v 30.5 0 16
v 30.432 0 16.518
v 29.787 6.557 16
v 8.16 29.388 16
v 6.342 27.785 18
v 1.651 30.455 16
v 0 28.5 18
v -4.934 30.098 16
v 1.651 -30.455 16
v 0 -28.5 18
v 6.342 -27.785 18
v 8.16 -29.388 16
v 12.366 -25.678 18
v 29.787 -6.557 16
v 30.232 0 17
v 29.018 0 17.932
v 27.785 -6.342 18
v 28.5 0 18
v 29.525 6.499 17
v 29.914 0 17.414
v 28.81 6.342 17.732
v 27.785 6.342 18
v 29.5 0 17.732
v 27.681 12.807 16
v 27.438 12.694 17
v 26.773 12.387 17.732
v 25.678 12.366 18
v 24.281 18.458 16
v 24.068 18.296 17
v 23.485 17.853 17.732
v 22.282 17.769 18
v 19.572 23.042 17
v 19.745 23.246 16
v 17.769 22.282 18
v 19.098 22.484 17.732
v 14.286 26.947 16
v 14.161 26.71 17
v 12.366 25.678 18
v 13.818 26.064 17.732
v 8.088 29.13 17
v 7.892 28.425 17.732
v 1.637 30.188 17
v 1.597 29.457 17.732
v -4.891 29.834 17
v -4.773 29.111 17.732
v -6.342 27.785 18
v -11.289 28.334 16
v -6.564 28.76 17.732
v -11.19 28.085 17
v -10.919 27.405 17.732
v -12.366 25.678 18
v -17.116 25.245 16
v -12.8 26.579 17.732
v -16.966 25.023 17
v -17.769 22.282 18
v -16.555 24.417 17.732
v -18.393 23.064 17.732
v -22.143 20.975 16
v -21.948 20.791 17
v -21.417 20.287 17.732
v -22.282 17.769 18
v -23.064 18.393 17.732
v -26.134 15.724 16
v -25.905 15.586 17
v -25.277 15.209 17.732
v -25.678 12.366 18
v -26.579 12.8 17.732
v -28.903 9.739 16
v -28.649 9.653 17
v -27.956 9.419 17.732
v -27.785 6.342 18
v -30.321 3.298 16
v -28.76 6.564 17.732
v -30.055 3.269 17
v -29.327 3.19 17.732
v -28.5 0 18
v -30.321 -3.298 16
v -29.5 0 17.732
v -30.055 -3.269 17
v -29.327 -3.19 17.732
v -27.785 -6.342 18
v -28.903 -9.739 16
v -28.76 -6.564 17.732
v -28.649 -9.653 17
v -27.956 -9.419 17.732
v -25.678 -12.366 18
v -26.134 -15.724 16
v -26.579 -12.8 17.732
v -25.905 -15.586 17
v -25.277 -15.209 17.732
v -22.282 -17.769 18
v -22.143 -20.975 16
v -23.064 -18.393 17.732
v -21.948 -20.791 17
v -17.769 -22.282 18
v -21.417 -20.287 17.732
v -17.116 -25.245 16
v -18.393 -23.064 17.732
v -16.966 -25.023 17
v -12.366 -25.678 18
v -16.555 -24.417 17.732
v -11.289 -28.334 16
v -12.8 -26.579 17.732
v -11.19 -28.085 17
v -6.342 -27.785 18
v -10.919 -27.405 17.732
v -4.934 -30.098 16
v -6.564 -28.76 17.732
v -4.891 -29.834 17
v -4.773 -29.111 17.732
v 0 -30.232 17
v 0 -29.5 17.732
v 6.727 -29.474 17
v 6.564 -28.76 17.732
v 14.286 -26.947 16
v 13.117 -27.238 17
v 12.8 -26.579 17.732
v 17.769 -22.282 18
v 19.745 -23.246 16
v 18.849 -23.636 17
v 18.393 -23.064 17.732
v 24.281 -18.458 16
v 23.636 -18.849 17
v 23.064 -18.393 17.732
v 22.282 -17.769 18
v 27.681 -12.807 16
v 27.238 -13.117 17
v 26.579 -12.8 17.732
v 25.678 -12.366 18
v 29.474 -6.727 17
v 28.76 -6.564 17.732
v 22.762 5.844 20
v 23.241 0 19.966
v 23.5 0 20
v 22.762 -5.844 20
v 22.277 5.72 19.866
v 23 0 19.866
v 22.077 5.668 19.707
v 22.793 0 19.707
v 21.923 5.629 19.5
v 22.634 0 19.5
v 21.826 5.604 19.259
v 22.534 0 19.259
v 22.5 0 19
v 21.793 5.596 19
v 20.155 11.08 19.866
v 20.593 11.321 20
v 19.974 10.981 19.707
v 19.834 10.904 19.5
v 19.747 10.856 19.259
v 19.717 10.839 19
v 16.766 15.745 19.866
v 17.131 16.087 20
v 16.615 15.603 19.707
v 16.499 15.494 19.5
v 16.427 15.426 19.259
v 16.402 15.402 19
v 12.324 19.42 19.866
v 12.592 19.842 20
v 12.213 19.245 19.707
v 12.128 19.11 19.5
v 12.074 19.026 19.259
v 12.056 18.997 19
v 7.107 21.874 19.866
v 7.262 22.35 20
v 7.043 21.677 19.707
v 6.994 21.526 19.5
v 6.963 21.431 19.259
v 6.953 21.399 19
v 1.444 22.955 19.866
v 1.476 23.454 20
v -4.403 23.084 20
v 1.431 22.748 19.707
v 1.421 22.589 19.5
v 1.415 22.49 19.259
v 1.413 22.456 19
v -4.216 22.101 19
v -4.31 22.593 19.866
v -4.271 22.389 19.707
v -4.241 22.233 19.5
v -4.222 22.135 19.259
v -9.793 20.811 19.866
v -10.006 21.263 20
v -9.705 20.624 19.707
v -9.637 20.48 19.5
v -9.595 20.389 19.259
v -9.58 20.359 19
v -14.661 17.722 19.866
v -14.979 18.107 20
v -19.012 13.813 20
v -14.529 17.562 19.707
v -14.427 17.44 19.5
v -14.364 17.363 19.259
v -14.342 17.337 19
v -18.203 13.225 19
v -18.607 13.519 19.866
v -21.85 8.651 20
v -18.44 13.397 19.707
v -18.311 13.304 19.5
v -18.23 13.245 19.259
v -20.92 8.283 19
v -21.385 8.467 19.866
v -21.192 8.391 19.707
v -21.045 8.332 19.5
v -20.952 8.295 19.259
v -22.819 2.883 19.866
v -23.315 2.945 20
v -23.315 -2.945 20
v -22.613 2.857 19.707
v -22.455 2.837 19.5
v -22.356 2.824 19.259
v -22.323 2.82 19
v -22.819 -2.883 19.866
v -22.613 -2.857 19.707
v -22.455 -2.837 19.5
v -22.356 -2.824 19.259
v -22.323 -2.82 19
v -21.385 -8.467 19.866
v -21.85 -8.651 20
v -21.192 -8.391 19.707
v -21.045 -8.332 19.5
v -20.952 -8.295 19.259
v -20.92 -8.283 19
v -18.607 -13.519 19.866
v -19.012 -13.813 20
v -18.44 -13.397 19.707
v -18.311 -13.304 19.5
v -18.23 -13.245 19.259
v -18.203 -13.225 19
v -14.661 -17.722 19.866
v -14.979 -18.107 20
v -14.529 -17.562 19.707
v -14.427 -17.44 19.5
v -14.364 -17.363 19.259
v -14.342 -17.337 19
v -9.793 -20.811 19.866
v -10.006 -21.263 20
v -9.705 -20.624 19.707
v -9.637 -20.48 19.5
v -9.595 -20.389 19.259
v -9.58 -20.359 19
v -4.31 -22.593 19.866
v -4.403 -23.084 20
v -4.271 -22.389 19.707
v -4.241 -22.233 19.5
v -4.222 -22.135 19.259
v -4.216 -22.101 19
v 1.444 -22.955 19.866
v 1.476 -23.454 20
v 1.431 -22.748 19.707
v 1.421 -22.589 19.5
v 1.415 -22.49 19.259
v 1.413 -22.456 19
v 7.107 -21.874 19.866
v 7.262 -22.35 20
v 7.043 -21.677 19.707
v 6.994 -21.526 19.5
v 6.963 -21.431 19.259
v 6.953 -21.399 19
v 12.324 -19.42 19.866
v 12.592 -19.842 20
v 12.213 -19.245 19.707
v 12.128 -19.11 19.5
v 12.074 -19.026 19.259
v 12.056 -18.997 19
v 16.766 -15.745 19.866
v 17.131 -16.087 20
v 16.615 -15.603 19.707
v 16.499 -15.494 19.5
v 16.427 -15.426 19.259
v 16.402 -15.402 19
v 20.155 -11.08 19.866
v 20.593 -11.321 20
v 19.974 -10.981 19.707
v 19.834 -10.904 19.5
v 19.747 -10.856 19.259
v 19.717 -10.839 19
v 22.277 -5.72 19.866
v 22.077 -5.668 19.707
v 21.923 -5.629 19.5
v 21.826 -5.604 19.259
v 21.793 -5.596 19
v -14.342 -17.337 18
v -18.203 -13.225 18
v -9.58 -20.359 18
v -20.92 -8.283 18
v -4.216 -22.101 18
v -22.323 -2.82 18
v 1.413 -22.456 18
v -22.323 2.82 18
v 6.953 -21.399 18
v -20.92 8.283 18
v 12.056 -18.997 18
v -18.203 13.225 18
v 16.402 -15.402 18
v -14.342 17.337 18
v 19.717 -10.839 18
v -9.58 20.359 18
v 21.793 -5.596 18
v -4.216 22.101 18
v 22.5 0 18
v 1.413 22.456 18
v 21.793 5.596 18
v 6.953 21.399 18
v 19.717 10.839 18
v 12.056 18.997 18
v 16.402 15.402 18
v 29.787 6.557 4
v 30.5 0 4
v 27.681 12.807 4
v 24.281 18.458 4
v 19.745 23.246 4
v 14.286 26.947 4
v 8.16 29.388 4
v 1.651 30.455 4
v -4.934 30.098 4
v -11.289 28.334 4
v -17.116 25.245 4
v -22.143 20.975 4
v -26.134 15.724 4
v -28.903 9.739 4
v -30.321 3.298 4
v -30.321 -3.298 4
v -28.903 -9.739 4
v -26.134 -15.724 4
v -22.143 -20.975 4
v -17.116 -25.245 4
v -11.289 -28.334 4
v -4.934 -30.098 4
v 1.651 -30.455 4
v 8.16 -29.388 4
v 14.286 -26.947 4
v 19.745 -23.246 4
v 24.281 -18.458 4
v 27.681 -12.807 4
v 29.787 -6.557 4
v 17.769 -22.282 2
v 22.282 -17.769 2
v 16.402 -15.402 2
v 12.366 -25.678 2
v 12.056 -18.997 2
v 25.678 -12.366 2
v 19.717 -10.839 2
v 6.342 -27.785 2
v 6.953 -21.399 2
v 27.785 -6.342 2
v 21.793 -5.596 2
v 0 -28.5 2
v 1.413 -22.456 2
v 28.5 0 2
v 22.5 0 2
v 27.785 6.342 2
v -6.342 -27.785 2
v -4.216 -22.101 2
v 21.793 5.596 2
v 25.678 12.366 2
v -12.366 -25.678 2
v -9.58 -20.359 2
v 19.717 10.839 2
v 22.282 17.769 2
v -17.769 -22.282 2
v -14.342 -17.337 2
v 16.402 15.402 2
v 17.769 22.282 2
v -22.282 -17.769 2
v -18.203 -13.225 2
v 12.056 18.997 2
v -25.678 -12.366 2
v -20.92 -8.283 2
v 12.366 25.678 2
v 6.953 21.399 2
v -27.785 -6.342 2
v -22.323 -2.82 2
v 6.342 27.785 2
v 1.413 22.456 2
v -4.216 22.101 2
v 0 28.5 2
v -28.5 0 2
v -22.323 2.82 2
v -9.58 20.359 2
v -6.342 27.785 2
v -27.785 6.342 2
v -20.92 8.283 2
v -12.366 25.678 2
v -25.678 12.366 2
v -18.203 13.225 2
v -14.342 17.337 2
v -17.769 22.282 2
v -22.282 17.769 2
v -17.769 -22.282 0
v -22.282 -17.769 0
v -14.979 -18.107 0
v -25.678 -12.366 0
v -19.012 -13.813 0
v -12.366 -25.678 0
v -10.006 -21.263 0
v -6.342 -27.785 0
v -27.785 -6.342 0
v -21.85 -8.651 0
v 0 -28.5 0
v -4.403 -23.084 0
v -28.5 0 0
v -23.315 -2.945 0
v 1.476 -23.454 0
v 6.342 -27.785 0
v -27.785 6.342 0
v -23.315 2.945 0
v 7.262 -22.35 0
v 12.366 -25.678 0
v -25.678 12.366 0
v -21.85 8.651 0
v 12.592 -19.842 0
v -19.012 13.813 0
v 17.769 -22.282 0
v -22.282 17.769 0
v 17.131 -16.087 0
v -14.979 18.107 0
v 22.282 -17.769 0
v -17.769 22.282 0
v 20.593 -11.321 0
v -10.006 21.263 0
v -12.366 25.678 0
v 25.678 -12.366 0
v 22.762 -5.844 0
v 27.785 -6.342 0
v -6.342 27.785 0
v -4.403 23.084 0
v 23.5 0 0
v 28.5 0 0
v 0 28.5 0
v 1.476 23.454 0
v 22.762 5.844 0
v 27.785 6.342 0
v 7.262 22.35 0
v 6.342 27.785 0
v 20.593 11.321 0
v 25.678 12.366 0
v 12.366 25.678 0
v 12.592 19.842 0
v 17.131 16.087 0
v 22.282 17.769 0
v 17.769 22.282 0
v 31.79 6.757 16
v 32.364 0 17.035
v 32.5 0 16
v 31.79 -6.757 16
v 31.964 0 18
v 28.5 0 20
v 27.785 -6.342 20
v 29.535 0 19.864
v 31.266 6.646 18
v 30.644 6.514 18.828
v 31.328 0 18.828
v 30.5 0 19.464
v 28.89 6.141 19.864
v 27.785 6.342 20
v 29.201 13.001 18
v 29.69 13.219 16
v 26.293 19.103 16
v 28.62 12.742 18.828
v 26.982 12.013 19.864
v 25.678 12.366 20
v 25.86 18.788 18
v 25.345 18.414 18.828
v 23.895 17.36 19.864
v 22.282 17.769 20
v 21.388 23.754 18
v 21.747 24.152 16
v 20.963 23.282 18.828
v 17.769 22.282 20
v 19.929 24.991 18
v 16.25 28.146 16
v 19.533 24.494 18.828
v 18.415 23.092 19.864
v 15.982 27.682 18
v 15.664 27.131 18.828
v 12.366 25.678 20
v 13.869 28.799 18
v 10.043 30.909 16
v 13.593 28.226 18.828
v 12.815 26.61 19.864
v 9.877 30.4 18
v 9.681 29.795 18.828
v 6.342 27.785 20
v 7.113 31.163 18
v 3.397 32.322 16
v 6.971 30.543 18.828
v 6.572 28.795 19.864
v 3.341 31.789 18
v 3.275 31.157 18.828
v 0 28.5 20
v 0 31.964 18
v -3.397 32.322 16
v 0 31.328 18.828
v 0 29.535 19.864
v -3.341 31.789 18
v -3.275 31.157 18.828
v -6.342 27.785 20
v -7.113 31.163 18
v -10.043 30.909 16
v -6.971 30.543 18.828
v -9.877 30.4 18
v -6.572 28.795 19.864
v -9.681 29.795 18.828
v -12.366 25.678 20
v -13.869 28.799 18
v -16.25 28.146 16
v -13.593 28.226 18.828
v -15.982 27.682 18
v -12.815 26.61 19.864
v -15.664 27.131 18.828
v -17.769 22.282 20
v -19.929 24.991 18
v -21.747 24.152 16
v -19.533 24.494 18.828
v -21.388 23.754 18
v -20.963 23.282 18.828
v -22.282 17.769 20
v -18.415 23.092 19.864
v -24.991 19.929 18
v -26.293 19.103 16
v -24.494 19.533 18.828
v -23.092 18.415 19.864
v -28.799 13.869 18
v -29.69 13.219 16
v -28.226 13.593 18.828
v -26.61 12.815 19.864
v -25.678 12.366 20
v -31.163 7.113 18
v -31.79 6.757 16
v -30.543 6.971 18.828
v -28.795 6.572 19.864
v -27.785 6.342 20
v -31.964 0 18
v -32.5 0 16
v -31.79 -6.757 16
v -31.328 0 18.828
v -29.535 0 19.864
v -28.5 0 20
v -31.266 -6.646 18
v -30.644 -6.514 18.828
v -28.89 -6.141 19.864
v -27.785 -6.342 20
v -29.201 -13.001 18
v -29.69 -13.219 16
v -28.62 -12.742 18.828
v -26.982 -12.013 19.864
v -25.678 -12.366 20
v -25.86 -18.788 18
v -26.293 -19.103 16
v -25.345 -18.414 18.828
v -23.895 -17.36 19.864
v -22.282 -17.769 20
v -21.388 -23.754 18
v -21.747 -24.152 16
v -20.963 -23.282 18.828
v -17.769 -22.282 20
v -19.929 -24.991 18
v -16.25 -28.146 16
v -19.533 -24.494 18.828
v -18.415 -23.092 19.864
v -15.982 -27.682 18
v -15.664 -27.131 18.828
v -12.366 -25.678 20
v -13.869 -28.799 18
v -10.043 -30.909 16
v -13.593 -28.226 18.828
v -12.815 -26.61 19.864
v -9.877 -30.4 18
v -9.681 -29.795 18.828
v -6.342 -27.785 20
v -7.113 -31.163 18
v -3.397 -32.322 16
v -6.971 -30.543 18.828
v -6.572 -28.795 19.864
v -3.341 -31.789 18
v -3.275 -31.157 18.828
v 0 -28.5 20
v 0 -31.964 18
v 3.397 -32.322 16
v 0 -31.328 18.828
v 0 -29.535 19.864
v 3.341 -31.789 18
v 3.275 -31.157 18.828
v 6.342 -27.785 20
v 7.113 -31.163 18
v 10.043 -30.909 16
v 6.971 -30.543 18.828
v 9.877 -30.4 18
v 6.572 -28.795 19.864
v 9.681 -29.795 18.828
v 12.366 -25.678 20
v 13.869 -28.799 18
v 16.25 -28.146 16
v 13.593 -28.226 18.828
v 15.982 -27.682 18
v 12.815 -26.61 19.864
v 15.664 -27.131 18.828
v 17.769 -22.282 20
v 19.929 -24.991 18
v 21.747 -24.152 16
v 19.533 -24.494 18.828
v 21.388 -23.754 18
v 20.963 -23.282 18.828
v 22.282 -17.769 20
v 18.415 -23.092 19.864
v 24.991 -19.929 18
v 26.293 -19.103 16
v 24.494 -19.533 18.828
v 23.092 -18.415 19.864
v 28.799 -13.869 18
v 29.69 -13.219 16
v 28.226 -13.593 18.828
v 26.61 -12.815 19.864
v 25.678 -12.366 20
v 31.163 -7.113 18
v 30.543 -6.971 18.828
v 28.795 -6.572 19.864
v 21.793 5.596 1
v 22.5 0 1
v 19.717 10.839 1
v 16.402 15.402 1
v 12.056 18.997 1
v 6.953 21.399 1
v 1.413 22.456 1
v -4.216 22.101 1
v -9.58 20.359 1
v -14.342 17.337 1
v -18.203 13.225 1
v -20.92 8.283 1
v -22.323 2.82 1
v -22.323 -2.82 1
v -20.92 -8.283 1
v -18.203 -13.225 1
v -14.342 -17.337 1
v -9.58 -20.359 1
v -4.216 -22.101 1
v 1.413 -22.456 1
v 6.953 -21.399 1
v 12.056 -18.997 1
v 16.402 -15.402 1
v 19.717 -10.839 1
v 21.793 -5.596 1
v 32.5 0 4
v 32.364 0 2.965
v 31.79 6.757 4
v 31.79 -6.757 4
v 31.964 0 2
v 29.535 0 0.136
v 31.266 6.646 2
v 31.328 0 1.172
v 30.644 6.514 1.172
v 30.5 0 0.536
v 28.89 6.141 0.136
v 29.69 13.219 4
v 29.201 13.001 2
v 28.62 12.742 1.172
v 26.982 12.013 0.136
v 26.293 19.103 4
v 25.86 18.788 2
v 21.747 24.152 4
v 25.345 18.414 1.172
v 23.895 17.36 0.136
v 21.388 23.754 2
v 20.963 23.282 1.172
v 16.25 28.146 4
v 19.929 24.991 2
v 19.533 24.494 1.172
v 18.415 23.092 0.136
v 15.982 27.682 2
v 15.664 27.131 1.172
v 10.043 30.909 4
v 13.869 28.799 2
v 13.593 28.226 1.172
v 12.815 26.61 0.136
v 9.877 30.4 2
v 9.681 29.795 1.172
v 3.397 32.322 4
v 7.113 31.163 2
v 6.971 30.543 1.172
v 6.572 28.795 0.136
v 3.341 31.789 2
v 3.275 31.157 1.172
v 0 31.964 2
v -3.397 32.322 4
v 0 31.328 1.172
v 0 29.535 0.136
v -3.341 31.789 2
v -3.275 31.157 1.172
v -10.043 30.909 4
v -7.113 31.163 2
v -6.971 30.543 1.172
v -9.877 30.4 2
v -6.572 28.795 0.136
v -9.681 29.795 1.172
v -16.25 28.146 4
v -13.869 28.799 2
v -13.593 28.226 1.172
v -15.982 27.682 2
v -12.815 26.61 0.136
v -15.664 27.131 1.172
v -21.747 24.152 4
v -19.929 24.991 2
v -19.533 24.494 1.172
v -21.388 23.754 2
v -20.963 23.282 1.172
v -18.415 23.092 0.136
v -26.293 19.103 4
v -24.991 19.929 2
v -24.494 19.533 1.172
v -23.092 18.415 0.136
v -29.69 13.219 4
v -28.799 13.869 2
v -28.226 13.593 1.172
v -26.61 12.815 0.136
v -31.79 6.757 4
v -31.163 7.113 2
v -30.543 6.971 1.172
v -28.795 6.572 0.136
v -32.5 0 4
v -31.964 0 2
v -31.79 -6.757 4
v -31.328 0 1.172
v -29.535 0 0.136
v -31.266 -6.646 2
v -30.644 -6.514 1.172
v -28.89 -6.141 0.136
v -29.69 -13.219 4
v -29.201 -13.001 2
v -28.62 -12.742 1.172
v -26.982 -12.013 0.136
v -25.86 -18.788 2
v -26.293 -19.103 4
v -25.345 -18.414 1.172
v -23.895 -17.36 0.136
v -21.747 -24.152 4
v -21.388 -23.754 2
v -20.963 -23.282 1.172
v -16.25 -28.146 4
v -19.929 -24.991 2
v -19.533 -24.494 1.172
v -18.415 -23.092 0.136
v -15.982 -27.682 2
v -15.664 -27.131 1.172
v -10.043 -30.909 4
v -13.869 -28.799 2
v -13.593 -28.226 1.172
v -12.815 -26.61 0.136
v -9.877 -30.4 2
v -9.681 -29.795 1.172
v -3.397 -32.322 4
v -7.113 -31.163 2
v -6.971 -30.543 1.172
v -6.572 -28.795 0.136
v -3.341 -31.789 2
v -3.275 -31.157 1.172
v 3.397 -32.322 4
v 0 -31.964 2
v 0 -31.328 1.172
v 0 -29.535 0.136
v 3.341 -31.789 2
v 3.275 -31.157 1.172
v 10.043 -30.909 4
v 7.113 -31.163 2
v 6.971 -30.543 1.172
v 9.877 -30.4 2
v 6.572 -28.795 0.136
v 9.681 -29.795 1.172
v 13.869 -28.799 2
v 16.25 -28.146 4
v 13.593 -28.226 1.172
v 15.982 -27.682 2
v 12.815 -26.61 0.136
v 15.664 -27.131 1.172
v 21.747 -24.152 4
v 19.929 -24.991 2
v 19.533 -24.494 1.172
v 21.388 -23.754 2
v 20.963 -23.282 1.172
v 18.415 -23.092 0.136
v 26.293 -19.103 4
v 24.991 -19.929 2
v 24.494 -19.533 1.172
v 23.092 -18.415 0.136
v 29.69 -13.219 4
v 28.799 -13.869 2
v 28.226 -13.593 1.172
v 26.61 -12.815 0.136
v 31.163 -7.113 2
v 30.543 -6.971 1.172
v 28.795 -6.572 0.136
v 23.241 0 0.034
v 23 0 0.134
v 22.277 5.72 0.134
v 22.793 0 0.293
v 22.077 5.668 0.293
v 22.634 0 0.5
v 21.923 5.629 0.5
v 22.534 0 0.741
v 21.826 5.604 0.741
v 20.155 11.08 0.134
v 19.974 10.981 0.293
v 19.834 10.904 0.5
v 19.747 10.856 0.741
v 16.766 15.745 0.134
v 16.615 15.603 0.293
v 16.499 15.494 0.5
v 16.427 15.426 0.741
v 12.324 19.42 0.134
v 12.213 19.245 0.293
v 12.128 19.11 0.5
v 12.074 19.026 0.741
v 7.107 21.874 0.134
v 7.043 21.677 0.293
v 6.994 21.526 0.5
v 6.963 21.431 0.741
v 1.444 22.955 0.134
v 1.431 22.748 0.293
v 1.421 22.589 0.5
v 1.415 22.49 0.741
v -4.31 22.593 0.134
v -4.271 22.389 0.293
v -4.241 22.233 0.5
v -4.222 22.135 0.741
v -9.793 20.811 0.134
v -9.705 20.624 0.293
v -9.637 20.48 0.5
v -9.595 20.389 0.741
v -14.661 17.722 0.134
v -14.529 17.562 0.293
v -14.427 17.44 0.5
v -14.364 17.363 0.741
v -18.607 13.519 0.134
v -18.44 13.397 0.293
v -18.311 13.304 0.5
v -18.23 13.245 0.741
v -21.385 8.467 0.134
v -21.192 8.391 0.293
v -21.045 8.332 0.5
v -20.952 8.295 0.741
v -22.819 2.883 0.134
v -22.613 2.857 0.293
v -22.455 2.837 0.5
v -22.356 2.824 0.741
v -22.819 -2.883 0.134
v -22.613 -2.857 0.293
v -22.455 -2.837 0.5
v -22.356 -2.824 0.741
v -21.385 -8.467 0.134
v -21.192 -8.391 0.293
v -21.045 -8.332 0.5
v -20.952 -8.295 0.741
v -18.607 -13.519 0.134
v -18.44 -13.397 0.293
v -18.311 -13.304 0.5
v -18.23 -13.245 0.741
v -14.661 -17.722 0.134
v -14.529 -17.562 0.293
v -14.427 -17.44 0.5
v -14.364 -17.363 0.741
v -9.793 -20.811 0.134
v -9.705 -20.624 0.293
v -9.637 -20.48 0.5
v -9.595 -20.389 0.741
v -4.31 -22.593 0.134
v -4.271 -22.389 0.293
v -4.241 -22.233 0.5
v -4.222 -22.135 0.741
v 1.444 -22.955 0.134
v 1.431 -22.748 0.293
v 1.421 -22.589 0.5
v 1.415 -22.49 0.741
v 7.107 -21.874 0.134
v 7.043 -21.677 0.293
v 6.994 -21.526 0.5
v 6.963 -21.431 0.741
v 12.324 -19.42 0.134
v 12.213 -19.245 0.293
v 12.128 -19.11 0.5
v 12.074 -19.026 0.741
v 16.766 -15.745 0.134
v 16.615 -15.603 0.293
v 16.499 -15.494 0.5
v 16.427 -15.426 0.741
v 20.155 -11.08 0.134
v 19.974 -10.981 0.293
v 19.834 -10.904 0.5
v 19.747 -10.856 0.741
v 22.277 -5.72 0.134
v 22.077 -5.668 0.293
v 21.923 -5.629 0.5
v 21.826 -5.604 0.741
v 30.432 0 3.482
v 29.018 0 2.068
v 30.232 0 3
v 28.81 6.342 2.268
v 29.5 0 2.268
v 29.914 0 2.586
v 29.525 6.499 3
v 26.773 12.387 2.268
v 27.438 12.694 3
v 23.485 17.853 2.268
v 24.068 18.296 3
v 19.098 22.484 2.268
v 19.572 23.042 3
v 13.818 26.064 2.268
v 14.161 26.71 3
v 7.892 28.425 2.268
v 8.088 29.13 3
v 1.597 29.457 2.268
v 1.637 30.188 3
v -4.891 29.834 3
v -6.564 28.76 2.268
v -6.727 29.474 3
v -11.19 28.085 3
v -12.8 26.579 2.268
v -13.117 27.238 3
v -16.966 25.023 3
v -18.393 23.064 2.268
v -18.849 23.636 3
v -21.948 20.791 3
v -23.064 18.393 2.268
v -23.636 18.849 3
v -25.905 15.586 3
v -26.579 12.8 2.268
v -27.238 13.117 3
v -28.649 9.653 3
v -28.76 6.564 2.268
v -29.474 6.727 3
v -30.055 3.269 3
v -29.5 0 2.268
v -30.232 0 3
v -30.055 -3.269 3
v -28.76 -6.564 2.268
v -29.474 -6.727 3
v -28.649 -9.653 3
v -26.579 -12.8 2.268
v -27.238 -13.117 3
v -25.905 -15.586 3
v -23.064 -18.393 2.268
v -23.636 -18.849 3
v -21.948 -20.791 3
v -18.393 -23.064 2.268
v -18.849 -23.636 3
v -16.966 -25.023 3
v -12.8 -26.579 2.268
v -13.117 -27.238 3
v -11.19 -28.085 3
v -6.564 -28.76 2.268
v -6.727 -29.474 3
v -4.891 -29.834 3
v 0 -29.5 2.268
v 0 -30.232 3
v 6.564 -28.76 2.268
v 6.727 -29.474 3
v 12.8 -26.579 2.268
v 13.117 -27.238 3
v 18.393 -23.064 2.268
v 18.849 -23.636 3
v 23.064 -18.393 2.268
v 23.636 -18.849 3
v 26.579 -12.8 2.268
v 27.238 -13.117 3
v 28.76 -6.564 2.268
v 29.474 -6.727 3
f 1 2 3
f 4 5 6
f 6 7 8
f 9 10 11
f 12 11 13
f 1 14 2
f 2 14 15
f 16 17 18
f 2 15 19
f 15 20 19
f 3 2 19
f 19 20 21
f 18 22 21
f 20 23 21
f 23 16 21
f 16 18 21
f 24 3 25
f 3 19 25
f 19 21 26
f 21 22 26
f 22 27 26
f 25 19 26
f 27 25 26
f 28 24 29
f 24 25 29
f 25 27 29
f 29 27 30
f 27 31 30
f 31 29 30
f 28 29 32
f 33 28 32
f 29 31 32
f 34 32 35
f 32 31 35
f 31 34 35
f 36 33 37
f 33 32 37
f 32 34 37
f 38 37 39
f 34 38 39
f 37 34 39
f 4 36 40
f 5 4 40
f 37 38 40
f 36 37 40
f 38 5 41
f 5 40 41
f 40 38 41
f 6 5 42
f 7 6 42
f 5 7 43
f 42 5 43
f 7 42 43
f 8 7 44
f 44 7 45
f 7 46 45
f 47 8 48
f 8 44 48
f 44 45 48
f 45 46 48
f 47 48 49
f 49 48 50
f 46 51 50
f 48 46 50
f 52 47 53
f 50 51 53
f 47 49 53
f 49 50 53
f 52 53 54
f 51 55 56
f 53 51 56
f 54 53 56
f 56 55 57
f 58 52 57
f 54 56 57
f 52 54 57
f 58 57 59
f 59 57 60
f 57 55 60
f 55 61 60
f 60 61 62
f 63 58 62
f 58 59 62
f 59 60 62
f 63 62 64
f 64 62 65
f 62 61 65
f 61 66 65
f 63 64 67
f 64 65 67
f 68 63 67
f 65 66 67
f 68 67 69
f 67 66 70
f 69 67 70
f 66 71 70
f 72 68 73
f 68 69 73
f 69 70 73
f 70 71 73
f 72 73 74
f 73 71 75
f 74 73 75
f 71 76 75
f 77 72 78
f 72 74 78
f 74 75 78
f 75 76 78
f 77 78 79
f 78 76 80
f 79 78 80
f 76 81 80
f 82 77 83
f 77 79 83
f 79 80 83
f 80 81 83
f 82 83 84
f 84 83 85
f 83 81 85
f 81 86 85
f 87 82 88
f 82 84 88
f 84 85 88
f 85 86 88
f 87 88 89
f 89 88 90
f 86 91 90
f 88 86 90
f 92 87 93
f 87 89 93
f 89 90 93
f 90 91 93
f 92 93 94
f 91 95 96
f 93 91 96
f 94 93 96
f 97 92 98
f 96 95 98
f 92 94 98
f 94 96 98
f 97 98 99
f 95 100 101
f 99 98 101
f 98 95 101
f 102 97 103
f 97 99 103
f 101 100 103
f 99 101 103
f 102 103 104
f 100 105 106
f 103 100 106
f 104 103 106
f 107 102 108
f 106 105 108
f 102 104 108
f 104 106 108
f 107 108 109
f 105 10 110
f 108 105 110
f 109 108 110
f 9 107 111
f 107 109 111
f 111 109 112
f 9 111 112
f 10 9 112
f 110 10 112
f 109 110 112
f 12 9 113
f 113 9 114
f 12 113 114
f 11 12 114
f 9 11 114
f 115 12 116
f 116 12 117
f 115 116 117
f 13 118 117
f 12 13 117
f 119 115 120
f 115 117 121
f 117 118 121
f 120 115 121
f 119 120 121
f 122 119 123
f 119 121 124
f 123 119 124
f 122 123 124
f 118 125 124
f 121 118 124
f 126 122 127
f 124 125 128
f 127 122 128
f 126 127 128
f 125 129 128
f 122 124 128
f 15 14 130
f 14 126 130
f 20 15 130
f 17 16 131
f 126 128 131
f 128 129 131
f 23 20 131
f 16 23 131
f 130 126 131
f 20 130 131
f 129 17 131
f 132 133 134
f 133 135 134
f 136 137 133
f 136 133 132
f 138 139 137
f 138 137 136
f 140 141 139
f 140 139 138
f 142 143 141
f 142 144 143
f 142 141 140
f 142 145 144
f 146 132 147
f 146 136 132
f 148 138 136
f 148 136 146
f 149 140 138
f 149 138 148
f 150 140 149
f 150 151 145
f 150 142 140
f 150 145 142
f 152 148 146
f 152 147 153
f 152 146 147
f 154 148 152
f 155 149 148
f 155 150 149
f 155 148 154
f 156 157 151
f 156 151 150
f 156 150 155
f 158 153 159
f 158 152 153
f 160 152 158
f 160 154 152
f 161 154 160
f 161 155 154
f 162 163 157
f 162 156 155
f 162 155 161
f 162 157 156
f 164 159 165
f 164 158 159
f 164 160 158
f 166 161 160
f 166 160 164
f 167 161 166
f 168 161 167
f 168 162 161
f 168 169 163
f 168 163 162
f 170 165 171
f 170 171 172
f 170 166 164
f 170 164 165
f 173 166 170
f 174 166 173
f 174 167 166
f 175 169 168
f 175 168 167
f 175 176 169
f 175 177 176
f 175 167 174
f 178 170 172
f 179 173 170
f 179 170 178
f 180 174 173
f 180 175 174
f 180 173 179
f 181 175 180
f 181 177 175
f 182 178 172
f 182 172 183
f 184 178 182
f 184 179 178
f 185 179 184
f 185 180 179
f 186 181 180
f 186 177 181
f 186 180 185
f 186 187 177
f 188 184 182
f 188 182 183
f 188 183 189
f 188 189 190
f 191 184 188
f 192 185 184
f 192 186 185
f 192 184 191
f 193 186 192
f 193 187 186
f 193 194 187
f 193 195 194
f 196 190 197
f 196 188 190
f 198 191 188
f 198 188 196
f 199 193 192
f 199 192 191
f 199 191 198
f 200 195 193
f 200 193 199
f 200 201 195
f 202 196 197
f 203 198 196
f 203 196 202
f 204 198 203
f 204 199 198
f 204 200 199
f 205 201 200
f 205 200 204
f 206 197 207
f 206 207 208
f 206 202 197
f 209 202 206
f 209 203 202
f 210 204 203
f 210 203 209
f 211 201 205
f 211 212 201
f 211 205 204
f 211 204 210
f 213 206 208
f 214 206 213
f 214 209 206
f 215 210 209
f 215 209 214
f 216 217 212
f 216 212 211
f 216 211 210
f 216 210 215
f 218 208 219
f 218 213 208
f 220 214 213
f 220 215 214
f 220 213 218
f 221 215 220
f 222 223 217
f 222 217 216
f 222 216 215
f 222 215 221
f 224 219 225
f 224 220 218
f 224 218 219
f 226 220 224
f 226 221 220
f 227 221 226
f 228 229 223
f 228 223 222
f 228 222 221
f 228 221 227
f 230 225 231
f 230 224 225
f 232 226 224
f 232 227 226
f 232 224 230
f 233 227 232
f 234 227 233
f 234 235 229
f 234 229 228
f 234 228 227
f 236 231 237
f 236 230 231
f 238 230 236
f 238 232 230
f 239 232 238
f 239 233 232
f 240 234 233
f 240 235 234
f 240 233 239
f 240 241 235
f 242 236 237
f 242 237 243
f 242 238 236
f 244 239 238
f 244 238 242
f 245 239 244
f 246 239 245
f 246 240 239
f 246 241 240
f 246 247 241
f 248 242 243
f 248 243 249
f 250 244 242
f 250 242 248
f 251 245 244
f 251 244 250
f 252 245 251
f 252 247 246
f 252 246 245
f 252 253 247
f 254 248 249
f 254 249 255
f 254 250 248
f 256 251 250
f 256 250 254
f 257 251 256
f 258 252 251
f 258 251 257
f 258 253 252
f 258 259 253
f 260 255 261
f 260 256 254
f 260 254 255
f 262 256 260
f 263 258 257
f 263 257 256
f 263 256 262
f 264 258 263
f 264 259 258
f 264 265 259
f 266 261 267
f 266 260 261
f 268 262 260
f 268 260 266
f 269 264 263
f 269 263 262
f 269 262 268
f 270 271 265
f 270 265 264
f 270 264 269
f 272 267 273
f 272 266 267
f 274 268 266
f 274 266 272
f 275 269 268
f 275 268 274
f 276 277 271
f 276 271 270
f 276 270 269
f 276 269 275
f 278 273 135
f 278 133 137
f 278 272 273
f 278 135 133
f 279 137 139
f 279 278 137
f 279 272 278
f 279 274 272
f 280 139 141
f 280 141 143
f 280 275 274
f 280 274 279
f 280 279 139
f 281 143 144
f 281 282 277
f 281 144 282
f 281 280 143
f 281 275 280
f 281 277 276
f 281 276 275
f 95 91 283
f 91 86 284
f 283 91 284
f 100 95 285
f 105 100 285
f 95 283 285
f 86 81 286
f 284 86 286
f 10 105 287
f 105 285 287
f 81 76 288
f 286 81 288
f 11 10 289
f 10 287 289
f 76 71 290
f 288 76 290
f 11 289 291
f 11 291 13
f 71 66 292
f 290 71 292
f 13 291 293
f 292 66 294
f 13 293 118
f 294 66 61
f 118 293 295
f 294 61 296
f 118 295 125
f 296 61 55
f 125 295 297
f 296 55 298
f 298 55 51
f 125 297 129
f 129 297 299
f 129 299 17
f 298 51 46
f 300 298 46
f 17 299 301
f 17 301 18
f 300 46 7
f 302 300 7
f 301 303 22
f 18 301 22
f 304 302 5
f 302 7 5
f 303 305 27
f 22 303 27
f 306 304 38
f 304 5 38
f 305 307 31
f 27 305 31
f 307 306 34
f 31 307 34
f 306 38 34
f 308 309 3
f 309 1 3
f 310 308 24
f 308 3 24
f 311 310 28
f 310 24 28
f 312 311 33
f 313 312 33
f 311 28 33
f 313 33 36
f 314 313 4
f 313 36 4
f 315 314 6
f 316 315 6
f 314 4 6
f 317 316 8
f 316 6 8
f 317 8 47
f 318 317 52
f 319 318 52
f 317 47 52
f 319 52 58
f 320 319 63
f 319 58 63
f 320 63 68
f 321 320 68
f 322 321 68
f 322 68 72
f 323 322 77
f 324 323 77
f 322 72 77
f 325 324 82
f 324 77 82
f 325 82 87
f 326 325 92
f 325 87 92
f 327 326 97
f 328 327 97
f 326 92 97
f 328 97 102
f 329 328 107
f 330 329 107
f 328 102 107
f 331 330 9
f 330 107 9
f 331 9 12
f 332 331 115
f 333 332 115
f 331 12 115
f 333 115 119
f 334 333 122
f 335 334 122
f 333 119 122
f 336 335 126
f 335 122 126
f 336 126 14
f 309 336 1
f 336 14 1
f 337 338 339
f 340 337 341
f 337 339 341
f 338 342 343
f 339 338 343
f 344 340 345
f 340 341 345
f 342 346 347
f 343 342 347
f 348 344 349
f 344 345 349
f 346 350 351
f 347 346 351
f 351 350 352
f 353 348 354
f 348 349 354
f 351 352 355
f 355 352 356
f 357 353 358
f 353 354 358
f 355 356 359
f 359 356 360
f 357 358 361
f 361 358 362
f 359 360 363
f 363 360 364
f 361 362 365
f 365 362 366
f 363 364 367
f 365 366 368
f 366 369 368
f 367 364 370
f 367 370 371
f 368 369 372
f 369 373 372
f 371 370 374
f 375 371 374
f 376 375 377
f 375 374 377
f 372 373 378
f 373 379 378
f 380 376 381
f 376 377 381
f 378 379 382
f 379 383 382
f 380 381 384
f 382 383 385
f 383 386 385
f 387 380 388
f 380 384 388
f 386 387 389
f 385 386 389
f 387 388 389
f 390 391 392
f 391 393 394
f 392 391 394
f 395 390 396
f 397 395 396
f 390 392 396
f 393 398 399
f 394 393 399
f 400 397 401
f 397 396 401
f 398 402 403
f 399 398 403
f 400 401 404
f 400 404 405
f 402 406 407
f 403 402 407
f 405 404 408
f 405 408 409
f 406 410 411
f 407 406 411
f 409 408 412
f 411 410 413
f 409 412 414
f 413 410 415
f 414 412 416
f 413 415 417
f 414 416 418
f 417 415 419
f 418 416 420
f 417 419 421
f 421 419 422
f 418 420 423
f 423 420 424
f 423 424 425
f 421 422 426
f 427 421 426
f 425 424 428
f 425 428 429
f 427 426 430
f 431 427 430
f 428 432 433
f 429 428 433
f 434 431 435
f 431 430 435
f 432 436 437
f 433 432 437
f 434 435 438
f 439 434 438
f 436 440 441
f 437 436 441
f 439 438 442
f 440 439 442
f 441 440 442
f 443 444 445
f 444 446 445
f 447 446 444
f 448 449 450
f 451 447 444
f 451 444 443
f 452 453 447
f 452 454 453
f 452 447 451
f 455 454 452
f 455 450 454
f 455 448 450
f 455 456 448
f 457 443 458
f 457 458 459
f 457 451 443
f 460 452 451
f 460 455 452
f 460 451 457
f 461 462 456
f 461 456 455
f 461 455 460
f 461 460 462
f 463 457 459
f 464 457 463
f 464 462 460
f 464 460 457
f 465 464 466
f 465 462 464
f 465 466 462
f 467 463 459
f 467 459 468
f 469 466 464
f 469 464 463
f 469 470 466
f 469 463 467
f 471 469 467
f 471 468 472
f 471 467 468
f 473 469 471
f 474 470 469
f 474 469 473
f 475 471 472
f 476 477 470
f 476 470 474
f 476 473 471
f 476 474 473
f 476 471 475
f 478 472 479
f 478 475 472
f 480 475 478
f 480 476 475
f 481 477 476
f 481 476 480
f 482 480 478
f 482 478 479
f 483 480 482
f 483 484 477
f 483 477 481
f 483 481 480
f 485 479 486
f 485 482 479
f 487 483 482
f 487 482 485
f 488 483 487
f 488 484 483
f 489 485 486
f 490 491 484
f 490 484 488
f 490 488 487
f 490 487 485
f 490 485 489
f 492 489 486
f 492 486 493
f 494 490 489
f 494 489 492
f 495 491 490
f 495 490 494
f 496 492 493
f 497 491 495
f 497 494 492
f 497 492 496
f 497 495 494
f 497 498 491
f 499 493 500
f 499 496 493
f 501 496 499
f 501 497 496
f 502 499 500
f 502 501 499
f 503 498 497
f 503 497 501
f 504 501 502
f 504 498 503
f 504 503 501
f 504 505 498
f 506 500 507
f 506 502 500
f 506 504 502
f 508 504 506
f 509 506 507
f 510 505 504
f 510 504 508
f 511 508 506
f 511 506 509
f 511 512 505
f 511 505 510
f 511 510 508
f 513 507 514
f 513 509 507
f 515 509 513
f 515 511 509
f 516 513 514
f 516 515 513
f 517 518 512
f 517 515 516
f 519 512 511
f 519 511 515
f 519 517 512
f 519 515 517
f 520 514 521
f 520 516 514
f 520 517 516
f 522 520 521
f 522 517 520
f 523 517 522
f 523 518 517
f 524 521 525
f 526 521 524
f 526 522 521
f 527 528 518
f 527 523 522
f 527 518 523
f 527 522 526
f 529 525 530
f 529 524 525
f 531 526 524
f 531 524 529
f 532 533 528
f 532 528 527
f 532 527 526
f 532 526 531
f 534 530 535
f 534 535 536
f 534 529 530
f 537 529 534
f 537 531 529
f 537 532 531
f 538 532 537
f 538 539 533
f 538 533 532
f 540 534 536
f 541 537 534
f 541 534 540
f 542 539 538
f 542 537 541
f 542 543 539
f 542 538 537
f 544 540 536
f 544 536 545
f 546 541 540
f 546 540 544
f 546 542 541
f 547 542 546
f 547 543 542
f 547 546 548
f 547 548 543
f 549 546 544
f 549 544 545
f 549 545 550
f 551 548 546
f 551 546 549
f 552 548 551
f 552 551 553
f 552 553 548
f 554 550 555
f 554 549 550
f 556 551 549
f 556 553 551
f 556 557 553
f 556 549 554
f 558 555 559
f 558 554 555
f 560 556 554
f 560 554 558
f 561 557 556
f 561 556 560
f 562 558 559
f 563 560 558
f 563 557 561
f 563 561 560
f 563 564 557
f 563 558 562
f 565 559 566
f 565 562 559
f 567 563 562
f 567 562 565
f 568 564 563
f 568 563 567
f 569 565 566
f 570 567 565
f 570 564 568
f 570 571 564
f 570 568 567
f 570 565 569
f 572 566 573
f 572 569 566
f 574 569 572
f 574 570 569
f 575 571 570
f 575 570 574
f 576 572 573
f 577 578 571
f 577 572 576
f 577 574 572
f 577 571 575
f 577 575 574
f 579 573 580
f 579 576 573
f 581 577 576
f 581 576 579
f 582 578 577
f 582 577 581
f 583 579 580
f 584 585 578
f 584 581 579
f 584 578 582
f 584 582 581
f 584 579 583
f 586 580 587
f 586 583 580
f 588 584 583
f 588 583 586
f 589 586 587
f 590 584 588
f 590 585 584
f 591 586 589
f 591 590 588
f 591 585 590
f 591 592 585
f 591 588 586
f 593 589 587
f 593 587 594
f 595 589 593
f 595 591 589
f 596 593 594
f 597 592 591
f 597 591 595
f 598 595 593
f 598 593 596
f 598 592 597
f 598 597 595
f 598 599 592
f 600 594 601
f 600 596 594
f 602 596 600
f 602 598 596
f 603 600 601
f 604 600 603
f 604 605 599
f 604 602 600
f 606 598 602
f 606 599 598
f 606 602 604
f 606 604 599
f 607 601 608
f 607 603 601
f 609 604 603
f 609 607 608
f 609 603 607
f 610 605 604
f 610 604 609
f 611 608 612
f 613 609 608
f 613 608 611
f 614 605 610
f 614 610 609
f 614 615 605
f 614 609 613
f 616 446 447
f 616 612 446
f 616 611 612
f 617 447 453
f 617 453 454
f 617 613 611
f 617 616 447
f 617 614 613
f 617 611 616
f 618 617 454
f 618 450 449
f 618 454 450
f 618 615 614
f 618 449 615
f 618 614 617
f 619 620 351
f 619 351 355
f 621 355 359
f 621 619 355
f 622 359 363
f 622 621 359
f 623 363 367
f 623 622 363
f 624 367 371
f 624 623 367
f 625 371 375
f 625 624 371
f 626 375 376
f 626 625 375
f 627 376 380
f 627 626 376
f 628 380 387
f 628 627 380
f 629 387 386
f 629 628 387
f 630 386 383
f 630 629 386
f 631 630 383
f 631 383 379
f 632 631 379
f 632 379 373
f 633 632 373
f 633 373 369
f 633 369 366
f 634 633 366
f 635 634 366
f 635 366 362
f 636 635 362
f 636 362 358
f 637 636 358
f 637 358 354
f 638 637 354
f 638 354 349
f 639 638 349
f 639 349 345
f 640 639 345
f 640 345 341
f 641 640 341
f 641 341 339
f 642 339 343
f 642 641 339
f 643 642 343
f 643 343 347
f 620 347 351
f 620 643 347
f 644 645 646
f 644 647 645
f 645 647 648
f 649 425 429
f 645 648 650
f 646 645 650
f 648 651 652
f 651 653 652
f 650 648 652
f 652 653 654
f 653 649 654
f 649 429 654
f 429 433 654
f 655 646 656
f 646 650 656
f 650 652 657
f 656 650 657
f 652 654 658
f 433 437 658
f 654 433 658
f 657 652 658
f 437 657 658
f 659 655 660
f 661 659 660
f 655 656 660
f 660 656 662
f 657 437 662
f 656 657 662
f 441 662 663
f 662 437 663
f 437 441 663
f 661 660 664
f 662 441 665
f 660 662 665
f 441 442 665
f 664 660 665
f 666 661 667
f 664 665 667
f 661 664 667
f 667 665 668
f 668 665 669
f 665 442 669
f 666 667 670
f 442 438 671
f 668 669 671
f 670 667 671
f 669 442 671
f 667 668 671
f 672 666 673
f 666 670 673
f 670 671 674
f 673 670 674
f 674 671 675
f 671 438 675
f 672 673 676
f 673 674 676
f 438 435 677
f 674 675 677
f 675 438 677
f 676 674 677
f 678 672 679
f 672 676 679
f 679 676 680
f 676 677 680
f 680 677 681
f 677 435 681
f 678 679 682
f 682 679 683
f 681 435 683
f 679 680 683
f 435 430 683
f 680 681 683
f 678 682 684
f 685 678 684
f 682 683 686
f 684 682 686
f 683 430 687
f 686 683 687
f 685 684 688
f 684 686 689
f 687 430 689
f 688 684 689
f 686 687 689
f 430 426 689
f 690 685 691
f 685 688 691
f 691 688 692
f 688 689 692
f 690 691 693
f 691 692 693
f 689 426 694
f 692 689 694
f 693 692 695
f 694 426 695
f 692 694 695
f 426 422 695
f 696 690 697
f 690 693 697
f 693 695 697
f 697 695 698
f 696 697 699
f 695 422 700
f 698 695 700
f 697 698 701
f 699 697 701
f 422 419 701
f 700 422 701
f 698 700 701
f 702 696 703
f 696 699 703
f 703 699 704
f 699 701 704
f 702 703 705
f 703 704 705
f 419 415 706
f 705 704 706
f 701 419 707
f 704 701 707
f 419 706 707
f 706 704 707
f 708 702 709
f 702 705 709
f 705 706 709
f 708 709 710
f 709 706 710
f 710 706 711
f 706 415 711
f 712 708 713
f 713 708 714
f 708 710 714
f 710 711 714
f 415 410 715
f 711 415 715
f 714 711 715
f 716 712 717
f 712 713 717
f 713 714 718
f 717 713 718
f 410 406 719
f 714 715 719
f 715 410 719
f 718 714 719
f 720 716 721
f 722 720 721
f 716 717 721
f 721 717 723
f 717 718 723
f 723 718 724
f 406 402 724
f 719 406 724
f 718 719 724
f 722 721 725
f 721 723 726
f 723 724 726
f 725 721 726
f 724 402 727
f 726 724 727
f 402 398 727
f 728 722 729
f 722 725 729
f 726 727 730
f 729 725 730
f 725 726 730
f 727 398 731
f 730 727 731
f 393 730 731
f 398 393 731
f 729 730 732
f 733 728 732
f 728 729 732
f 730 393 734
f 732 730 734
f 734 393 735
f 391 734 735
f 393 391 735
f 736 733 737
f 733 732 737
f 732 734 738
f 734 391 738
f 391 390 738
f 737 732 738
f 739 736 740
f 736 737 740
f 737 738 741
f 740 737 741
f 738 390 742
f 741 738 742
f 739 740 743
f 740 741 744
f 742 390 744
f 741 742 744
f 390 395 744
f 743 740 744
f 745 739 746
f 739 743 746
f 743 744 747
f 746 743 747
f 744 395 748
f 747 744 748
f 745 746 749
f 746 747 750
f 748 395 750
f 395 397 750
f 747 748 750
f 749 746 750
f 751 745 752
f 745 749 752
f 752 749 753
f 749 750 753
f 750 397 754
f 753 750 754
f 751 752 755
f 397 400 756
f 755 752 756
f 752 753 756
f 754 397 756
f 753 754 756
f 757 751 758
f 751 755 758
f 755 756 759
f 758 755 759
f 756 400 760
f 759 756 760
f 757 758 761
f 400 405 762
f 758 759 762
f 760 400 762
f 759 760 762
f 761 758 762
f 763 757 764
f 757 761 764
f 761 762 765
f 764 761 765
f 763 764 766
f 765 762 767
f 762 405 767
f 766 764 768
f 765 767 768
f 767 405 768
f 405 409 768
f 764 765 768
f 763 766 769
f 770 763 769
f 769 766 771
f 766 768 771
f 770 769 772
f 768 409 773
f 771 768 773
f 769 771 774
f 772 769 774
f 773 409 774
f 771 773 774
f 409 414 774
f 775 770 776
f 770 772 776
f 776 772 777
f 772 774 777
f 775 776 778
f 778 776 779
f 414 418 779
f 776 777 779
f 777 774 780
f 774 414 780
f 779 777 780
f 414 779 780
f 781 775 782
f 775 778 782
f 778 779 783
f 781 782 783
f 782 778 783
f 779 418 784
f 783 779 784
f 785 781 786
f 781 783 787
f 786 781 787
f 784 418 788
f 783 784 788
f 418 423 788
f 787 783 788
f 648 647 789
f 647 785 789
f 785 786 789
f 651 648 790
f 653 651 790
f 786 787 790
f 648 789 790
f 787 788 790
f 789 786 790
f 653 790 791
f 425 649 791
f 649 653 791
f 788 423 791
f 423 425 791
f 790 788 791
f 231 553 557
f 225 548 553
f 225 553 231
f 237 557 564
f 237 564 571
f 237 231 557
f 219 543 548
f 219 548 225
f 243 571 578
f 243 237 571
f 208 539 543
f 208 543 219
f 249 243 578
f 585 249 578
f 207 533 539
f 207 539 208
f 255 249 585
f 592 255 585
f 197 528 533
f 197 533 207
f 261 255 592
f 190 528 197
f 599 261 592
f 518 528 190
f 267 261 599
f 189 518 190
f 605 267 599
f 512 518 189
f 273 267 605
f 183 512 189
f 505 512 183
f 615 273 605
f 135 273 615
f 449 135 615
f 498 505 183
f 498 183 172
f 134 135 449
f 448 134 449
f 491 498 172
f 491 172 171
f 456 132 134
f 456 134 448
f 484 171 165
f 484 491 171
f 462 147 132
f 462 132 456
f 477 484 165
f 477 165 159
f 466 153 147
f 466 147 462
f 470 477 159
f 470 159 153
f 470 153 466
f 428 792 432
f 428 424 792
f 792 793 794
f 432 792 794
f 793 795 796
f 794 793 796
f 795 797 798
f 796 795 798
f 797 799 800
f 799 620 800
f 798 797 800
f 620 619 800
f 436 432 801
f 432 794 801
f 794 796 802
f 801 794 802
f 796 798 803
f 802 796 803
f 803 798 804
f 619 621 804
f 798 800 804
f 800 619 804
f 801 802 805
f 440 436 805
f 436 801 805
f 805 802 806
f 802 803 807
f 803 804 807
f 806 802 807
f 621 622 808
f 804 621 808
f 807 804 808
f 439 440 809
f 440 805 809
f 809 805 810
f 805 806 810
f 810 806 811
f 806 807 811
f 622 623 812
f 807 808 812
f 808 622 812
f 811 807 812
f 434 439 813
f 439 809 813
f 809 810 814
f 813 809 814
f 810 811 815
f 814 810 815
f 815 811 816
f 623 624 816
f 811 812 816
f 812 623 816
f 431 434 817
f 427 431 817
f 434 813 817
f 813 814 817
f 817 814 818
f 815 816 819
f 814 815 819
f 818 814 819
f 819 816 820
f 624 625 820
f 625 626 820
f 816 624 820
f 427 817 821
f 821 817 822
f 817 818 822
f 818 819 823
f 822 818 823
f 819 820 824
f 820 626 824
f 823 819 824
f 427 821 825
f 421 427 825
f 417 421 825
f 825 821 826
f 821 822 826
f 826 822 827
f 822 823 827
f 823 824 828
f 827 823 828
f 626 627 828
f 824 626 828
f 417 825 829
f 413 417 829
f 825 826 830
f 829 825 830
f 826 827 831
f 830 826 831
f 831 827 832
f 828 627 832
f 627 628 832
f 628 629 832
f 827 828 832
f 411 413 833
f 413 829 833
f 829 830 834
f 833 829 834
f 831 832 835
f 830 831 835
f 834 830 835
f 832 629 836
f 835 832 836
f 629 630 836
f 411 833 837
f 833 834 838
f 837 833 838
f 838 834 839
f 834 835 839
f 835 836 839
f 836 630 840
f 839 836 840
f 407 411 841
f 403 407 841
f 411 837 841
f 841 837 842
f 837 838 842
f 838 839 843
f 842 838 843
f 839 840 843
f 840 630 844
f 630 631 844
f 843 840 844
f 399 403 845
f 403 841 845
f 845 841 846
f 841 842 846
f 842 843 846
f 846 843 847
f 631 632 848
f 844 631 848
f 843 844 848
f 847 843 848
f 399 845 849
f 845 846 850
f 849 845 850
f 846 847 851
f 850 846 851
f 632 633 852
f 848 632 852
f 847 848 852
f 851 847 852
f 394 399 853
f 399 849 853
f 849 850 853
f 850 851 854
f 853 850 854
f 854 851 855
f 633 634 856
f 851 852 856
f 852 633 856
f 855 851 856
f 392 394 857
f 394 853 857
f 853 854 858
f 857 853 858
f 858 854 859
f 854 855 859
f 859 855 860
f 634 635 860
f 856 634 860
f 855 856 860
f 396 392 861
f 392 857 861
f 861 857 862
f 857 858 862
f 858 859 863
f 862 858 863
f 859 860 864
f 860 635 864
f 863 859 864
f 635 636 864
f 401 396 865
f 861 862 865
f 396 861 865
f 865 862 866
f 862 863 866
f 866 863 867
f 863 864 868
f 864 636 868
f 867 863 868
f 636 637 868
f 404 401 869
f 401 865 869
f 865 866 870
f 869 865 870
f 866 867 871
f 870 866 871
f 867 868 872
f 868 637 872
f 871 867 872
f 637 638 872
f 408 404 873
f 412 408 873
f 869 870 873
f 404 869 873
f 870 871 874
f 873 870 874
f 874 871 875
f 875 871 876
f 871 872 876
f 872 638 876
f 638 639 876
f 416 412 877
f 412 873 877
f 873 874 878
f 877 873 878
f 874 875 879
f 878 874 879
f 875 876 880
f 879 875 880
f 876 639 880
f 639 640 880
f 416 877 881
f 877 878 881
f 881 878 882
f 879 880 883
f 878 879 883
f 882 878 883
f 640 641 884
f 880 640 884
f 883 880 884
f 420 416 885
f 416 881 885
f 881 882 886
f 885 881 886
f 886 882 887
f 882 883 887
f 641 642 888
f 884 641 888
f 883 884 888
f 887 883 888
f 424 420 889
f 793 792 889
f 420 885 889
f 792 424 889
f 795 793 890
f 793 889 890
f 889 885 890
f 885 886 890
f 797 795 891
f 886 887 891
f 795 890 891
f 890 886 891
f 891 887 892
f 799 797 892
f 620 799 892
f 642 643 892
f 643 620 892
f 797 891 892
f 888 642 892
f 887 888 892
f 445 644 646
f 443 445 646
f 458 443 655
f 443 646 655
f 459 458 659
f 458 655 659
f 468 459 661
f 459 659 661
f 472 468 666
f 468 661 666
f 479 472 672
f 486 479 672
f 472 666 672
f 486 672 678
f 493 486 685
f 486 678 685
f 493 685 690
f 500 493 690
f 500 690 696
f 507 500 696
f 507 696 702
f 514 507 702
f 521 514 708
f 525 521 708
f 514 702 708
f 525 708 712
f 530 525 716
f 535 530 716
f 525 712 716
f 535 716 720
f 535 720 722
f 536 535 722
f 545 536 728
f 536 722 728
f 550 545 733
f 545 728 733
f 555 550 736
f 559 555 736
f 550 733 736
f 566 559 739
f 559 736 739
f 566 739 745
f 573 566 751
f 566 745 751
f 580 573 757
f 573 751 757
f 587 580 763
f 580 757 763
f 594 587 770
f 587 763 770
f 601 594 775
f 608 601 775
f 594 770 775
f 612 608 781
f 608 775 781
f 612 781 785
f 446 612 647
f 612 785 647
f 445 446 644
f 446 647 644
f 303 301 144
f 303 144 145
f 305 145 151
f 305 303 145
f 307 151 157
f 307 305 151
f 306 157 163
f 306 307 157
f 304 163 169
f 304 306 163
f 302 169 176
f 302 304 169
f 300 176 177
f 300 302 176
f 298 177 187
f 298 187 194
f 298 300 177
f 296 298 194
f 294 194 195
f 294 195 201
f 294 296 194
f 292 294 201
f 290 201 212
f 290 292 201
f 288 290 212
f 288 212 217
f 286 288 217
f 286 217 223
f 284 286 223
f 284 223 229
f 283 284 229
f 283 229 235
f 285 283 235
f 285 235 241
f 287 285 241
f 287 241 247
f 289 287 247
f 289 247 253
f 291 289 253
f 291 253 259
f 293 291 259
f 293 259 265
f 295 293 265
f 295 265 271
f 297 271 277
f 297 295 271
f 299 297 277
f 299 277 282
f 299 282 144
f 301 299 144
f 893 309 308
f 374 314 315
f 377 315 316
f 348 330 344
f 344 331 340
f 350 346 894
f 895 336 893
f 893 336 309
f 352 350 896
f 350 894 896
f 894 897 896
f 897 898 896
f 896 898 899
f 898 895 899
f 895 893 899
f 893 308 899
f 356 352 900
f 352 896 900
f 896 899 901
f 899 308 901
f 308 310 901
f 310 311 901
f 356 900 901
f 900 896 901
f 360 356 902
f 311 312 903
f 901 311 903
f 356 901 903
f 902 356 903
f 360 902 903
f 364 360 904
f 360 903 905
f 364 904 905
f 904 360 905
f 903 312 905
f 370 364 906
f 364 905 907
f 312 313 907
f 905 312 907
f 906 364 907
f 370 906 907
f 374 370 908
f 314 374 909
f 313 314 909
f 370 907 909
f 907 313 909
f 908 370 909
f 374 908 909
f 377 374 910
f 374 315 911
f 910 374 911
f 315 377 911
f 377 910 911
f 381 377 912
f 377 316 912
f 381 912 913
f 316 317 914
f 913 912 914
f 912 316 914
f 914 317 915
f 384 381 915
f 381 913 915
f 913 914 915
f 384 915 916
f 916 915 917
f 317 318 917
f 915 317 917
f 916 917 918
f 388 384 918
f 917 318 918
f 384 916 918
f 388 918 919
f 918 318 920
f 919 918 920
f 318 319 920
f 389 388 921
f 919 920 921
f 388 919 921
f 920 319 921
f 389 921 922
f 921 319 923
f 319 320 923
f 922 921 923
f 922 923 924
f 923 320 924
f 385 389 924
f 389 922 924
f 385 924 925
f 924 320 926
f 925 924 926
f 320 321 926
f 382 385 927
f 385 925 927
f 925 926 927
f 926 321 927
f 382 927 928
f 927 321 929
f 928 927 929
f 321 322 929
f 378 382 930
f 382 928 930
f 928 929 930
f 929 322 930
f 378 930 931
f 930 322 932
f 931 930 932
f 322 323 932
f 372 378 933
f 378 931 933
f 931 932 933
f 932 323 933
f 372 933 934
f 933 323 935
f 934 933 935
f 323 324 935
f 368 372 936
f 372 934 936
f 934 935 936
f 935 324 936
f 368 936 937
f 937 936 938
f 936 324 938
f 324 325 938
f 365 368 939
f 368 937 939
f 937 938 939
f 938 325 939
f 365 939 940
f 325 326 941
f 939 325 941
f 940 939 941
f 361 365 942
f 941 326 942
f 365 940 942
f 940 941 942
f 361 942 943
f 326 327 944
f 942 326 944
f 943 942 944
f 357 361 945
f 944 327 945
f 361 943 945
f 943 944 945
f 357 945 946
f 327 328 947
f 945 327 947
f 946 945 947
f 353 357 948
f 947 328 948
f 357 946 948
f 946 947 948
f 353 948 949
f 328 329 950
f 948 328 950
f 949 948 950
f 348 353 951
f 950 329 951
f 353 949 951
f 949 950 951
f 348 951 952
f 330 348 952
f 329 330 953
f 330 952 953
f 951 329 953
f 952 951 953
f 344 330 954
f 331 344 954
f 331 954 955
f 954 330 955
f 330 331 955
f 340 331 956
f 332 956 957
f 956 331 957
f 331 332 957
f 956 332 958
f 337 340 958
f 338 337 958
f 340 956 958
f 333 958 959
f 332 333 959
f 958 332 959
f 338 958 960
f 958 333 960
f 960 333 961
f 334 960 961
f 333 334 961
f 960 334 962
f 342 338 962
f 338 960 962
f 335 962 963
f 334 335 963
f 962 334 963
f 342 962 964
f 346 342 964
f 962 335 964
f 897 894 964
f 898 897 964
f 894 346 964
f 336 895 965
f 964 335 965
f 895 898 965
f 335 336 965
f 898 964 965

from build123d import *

# Parameters (mm, degrees)
SKETCH1_R           = 32.5
SKETCH1_R_2         = 22.5
EXTRUDE_THIN1_DEPTH = 20
FILLET1_R           = 4
FILLET2_R           = 1


# Read off the part's stored shape, not the designer's step: Shell1
with BuildPart() as part:
    # Sketch1 → Extrude-Thin1 (new body)
    with BuildSketch(Plane.XY):
        Circle(SKETCH1_R)
        Circle(SKETCH1_R_2, mode=Mode.SUBTRACT)
    extrude(amount=EXTRUDE_THIN1_DEPTH)

    # Fillet1
    fillet1_edges = [part.edges().sort_by_distance(p)[0] for p in [
        (-32.5, 0, 0),
        (-32.5, 0, 20),
    ]]
    fillet(fillet1_edges, radius=FILLET1_R)

    # Fillet2
    fillet2_edges = [part.edges().sort_by_distance(p)[0] for p in [
        (-22.5, 0, 0),
        (-22.5, 0, 20),
    ]]
    fillet(fillet2_edges, radius=FILLET2_R)

    # Shell1 outline → Shell1 (revolve, cut)
    with BuildSketch(Plane.XZ):
        with BuildLine():
            Line((28.5, 18), (22.5, 18))
            Line((22.5, 18), (22.5, 2))
            Line((22.5, 2), (28.5, 2))
            ThreePointArc((28.5, 2), (29.914213562, 2.585786438), (30.5, 4))
            Line((30.5, 4), (30.5, 16))
            ThreePointArc((30.5, 16), (29.914213562, 17.414213562), (28.5, 18))
        make_face()
    revolve(axis=Axis((0, 0, 0), (0, 0, 1)), mode=Mode.SUBTRACT)


solid = part.part
